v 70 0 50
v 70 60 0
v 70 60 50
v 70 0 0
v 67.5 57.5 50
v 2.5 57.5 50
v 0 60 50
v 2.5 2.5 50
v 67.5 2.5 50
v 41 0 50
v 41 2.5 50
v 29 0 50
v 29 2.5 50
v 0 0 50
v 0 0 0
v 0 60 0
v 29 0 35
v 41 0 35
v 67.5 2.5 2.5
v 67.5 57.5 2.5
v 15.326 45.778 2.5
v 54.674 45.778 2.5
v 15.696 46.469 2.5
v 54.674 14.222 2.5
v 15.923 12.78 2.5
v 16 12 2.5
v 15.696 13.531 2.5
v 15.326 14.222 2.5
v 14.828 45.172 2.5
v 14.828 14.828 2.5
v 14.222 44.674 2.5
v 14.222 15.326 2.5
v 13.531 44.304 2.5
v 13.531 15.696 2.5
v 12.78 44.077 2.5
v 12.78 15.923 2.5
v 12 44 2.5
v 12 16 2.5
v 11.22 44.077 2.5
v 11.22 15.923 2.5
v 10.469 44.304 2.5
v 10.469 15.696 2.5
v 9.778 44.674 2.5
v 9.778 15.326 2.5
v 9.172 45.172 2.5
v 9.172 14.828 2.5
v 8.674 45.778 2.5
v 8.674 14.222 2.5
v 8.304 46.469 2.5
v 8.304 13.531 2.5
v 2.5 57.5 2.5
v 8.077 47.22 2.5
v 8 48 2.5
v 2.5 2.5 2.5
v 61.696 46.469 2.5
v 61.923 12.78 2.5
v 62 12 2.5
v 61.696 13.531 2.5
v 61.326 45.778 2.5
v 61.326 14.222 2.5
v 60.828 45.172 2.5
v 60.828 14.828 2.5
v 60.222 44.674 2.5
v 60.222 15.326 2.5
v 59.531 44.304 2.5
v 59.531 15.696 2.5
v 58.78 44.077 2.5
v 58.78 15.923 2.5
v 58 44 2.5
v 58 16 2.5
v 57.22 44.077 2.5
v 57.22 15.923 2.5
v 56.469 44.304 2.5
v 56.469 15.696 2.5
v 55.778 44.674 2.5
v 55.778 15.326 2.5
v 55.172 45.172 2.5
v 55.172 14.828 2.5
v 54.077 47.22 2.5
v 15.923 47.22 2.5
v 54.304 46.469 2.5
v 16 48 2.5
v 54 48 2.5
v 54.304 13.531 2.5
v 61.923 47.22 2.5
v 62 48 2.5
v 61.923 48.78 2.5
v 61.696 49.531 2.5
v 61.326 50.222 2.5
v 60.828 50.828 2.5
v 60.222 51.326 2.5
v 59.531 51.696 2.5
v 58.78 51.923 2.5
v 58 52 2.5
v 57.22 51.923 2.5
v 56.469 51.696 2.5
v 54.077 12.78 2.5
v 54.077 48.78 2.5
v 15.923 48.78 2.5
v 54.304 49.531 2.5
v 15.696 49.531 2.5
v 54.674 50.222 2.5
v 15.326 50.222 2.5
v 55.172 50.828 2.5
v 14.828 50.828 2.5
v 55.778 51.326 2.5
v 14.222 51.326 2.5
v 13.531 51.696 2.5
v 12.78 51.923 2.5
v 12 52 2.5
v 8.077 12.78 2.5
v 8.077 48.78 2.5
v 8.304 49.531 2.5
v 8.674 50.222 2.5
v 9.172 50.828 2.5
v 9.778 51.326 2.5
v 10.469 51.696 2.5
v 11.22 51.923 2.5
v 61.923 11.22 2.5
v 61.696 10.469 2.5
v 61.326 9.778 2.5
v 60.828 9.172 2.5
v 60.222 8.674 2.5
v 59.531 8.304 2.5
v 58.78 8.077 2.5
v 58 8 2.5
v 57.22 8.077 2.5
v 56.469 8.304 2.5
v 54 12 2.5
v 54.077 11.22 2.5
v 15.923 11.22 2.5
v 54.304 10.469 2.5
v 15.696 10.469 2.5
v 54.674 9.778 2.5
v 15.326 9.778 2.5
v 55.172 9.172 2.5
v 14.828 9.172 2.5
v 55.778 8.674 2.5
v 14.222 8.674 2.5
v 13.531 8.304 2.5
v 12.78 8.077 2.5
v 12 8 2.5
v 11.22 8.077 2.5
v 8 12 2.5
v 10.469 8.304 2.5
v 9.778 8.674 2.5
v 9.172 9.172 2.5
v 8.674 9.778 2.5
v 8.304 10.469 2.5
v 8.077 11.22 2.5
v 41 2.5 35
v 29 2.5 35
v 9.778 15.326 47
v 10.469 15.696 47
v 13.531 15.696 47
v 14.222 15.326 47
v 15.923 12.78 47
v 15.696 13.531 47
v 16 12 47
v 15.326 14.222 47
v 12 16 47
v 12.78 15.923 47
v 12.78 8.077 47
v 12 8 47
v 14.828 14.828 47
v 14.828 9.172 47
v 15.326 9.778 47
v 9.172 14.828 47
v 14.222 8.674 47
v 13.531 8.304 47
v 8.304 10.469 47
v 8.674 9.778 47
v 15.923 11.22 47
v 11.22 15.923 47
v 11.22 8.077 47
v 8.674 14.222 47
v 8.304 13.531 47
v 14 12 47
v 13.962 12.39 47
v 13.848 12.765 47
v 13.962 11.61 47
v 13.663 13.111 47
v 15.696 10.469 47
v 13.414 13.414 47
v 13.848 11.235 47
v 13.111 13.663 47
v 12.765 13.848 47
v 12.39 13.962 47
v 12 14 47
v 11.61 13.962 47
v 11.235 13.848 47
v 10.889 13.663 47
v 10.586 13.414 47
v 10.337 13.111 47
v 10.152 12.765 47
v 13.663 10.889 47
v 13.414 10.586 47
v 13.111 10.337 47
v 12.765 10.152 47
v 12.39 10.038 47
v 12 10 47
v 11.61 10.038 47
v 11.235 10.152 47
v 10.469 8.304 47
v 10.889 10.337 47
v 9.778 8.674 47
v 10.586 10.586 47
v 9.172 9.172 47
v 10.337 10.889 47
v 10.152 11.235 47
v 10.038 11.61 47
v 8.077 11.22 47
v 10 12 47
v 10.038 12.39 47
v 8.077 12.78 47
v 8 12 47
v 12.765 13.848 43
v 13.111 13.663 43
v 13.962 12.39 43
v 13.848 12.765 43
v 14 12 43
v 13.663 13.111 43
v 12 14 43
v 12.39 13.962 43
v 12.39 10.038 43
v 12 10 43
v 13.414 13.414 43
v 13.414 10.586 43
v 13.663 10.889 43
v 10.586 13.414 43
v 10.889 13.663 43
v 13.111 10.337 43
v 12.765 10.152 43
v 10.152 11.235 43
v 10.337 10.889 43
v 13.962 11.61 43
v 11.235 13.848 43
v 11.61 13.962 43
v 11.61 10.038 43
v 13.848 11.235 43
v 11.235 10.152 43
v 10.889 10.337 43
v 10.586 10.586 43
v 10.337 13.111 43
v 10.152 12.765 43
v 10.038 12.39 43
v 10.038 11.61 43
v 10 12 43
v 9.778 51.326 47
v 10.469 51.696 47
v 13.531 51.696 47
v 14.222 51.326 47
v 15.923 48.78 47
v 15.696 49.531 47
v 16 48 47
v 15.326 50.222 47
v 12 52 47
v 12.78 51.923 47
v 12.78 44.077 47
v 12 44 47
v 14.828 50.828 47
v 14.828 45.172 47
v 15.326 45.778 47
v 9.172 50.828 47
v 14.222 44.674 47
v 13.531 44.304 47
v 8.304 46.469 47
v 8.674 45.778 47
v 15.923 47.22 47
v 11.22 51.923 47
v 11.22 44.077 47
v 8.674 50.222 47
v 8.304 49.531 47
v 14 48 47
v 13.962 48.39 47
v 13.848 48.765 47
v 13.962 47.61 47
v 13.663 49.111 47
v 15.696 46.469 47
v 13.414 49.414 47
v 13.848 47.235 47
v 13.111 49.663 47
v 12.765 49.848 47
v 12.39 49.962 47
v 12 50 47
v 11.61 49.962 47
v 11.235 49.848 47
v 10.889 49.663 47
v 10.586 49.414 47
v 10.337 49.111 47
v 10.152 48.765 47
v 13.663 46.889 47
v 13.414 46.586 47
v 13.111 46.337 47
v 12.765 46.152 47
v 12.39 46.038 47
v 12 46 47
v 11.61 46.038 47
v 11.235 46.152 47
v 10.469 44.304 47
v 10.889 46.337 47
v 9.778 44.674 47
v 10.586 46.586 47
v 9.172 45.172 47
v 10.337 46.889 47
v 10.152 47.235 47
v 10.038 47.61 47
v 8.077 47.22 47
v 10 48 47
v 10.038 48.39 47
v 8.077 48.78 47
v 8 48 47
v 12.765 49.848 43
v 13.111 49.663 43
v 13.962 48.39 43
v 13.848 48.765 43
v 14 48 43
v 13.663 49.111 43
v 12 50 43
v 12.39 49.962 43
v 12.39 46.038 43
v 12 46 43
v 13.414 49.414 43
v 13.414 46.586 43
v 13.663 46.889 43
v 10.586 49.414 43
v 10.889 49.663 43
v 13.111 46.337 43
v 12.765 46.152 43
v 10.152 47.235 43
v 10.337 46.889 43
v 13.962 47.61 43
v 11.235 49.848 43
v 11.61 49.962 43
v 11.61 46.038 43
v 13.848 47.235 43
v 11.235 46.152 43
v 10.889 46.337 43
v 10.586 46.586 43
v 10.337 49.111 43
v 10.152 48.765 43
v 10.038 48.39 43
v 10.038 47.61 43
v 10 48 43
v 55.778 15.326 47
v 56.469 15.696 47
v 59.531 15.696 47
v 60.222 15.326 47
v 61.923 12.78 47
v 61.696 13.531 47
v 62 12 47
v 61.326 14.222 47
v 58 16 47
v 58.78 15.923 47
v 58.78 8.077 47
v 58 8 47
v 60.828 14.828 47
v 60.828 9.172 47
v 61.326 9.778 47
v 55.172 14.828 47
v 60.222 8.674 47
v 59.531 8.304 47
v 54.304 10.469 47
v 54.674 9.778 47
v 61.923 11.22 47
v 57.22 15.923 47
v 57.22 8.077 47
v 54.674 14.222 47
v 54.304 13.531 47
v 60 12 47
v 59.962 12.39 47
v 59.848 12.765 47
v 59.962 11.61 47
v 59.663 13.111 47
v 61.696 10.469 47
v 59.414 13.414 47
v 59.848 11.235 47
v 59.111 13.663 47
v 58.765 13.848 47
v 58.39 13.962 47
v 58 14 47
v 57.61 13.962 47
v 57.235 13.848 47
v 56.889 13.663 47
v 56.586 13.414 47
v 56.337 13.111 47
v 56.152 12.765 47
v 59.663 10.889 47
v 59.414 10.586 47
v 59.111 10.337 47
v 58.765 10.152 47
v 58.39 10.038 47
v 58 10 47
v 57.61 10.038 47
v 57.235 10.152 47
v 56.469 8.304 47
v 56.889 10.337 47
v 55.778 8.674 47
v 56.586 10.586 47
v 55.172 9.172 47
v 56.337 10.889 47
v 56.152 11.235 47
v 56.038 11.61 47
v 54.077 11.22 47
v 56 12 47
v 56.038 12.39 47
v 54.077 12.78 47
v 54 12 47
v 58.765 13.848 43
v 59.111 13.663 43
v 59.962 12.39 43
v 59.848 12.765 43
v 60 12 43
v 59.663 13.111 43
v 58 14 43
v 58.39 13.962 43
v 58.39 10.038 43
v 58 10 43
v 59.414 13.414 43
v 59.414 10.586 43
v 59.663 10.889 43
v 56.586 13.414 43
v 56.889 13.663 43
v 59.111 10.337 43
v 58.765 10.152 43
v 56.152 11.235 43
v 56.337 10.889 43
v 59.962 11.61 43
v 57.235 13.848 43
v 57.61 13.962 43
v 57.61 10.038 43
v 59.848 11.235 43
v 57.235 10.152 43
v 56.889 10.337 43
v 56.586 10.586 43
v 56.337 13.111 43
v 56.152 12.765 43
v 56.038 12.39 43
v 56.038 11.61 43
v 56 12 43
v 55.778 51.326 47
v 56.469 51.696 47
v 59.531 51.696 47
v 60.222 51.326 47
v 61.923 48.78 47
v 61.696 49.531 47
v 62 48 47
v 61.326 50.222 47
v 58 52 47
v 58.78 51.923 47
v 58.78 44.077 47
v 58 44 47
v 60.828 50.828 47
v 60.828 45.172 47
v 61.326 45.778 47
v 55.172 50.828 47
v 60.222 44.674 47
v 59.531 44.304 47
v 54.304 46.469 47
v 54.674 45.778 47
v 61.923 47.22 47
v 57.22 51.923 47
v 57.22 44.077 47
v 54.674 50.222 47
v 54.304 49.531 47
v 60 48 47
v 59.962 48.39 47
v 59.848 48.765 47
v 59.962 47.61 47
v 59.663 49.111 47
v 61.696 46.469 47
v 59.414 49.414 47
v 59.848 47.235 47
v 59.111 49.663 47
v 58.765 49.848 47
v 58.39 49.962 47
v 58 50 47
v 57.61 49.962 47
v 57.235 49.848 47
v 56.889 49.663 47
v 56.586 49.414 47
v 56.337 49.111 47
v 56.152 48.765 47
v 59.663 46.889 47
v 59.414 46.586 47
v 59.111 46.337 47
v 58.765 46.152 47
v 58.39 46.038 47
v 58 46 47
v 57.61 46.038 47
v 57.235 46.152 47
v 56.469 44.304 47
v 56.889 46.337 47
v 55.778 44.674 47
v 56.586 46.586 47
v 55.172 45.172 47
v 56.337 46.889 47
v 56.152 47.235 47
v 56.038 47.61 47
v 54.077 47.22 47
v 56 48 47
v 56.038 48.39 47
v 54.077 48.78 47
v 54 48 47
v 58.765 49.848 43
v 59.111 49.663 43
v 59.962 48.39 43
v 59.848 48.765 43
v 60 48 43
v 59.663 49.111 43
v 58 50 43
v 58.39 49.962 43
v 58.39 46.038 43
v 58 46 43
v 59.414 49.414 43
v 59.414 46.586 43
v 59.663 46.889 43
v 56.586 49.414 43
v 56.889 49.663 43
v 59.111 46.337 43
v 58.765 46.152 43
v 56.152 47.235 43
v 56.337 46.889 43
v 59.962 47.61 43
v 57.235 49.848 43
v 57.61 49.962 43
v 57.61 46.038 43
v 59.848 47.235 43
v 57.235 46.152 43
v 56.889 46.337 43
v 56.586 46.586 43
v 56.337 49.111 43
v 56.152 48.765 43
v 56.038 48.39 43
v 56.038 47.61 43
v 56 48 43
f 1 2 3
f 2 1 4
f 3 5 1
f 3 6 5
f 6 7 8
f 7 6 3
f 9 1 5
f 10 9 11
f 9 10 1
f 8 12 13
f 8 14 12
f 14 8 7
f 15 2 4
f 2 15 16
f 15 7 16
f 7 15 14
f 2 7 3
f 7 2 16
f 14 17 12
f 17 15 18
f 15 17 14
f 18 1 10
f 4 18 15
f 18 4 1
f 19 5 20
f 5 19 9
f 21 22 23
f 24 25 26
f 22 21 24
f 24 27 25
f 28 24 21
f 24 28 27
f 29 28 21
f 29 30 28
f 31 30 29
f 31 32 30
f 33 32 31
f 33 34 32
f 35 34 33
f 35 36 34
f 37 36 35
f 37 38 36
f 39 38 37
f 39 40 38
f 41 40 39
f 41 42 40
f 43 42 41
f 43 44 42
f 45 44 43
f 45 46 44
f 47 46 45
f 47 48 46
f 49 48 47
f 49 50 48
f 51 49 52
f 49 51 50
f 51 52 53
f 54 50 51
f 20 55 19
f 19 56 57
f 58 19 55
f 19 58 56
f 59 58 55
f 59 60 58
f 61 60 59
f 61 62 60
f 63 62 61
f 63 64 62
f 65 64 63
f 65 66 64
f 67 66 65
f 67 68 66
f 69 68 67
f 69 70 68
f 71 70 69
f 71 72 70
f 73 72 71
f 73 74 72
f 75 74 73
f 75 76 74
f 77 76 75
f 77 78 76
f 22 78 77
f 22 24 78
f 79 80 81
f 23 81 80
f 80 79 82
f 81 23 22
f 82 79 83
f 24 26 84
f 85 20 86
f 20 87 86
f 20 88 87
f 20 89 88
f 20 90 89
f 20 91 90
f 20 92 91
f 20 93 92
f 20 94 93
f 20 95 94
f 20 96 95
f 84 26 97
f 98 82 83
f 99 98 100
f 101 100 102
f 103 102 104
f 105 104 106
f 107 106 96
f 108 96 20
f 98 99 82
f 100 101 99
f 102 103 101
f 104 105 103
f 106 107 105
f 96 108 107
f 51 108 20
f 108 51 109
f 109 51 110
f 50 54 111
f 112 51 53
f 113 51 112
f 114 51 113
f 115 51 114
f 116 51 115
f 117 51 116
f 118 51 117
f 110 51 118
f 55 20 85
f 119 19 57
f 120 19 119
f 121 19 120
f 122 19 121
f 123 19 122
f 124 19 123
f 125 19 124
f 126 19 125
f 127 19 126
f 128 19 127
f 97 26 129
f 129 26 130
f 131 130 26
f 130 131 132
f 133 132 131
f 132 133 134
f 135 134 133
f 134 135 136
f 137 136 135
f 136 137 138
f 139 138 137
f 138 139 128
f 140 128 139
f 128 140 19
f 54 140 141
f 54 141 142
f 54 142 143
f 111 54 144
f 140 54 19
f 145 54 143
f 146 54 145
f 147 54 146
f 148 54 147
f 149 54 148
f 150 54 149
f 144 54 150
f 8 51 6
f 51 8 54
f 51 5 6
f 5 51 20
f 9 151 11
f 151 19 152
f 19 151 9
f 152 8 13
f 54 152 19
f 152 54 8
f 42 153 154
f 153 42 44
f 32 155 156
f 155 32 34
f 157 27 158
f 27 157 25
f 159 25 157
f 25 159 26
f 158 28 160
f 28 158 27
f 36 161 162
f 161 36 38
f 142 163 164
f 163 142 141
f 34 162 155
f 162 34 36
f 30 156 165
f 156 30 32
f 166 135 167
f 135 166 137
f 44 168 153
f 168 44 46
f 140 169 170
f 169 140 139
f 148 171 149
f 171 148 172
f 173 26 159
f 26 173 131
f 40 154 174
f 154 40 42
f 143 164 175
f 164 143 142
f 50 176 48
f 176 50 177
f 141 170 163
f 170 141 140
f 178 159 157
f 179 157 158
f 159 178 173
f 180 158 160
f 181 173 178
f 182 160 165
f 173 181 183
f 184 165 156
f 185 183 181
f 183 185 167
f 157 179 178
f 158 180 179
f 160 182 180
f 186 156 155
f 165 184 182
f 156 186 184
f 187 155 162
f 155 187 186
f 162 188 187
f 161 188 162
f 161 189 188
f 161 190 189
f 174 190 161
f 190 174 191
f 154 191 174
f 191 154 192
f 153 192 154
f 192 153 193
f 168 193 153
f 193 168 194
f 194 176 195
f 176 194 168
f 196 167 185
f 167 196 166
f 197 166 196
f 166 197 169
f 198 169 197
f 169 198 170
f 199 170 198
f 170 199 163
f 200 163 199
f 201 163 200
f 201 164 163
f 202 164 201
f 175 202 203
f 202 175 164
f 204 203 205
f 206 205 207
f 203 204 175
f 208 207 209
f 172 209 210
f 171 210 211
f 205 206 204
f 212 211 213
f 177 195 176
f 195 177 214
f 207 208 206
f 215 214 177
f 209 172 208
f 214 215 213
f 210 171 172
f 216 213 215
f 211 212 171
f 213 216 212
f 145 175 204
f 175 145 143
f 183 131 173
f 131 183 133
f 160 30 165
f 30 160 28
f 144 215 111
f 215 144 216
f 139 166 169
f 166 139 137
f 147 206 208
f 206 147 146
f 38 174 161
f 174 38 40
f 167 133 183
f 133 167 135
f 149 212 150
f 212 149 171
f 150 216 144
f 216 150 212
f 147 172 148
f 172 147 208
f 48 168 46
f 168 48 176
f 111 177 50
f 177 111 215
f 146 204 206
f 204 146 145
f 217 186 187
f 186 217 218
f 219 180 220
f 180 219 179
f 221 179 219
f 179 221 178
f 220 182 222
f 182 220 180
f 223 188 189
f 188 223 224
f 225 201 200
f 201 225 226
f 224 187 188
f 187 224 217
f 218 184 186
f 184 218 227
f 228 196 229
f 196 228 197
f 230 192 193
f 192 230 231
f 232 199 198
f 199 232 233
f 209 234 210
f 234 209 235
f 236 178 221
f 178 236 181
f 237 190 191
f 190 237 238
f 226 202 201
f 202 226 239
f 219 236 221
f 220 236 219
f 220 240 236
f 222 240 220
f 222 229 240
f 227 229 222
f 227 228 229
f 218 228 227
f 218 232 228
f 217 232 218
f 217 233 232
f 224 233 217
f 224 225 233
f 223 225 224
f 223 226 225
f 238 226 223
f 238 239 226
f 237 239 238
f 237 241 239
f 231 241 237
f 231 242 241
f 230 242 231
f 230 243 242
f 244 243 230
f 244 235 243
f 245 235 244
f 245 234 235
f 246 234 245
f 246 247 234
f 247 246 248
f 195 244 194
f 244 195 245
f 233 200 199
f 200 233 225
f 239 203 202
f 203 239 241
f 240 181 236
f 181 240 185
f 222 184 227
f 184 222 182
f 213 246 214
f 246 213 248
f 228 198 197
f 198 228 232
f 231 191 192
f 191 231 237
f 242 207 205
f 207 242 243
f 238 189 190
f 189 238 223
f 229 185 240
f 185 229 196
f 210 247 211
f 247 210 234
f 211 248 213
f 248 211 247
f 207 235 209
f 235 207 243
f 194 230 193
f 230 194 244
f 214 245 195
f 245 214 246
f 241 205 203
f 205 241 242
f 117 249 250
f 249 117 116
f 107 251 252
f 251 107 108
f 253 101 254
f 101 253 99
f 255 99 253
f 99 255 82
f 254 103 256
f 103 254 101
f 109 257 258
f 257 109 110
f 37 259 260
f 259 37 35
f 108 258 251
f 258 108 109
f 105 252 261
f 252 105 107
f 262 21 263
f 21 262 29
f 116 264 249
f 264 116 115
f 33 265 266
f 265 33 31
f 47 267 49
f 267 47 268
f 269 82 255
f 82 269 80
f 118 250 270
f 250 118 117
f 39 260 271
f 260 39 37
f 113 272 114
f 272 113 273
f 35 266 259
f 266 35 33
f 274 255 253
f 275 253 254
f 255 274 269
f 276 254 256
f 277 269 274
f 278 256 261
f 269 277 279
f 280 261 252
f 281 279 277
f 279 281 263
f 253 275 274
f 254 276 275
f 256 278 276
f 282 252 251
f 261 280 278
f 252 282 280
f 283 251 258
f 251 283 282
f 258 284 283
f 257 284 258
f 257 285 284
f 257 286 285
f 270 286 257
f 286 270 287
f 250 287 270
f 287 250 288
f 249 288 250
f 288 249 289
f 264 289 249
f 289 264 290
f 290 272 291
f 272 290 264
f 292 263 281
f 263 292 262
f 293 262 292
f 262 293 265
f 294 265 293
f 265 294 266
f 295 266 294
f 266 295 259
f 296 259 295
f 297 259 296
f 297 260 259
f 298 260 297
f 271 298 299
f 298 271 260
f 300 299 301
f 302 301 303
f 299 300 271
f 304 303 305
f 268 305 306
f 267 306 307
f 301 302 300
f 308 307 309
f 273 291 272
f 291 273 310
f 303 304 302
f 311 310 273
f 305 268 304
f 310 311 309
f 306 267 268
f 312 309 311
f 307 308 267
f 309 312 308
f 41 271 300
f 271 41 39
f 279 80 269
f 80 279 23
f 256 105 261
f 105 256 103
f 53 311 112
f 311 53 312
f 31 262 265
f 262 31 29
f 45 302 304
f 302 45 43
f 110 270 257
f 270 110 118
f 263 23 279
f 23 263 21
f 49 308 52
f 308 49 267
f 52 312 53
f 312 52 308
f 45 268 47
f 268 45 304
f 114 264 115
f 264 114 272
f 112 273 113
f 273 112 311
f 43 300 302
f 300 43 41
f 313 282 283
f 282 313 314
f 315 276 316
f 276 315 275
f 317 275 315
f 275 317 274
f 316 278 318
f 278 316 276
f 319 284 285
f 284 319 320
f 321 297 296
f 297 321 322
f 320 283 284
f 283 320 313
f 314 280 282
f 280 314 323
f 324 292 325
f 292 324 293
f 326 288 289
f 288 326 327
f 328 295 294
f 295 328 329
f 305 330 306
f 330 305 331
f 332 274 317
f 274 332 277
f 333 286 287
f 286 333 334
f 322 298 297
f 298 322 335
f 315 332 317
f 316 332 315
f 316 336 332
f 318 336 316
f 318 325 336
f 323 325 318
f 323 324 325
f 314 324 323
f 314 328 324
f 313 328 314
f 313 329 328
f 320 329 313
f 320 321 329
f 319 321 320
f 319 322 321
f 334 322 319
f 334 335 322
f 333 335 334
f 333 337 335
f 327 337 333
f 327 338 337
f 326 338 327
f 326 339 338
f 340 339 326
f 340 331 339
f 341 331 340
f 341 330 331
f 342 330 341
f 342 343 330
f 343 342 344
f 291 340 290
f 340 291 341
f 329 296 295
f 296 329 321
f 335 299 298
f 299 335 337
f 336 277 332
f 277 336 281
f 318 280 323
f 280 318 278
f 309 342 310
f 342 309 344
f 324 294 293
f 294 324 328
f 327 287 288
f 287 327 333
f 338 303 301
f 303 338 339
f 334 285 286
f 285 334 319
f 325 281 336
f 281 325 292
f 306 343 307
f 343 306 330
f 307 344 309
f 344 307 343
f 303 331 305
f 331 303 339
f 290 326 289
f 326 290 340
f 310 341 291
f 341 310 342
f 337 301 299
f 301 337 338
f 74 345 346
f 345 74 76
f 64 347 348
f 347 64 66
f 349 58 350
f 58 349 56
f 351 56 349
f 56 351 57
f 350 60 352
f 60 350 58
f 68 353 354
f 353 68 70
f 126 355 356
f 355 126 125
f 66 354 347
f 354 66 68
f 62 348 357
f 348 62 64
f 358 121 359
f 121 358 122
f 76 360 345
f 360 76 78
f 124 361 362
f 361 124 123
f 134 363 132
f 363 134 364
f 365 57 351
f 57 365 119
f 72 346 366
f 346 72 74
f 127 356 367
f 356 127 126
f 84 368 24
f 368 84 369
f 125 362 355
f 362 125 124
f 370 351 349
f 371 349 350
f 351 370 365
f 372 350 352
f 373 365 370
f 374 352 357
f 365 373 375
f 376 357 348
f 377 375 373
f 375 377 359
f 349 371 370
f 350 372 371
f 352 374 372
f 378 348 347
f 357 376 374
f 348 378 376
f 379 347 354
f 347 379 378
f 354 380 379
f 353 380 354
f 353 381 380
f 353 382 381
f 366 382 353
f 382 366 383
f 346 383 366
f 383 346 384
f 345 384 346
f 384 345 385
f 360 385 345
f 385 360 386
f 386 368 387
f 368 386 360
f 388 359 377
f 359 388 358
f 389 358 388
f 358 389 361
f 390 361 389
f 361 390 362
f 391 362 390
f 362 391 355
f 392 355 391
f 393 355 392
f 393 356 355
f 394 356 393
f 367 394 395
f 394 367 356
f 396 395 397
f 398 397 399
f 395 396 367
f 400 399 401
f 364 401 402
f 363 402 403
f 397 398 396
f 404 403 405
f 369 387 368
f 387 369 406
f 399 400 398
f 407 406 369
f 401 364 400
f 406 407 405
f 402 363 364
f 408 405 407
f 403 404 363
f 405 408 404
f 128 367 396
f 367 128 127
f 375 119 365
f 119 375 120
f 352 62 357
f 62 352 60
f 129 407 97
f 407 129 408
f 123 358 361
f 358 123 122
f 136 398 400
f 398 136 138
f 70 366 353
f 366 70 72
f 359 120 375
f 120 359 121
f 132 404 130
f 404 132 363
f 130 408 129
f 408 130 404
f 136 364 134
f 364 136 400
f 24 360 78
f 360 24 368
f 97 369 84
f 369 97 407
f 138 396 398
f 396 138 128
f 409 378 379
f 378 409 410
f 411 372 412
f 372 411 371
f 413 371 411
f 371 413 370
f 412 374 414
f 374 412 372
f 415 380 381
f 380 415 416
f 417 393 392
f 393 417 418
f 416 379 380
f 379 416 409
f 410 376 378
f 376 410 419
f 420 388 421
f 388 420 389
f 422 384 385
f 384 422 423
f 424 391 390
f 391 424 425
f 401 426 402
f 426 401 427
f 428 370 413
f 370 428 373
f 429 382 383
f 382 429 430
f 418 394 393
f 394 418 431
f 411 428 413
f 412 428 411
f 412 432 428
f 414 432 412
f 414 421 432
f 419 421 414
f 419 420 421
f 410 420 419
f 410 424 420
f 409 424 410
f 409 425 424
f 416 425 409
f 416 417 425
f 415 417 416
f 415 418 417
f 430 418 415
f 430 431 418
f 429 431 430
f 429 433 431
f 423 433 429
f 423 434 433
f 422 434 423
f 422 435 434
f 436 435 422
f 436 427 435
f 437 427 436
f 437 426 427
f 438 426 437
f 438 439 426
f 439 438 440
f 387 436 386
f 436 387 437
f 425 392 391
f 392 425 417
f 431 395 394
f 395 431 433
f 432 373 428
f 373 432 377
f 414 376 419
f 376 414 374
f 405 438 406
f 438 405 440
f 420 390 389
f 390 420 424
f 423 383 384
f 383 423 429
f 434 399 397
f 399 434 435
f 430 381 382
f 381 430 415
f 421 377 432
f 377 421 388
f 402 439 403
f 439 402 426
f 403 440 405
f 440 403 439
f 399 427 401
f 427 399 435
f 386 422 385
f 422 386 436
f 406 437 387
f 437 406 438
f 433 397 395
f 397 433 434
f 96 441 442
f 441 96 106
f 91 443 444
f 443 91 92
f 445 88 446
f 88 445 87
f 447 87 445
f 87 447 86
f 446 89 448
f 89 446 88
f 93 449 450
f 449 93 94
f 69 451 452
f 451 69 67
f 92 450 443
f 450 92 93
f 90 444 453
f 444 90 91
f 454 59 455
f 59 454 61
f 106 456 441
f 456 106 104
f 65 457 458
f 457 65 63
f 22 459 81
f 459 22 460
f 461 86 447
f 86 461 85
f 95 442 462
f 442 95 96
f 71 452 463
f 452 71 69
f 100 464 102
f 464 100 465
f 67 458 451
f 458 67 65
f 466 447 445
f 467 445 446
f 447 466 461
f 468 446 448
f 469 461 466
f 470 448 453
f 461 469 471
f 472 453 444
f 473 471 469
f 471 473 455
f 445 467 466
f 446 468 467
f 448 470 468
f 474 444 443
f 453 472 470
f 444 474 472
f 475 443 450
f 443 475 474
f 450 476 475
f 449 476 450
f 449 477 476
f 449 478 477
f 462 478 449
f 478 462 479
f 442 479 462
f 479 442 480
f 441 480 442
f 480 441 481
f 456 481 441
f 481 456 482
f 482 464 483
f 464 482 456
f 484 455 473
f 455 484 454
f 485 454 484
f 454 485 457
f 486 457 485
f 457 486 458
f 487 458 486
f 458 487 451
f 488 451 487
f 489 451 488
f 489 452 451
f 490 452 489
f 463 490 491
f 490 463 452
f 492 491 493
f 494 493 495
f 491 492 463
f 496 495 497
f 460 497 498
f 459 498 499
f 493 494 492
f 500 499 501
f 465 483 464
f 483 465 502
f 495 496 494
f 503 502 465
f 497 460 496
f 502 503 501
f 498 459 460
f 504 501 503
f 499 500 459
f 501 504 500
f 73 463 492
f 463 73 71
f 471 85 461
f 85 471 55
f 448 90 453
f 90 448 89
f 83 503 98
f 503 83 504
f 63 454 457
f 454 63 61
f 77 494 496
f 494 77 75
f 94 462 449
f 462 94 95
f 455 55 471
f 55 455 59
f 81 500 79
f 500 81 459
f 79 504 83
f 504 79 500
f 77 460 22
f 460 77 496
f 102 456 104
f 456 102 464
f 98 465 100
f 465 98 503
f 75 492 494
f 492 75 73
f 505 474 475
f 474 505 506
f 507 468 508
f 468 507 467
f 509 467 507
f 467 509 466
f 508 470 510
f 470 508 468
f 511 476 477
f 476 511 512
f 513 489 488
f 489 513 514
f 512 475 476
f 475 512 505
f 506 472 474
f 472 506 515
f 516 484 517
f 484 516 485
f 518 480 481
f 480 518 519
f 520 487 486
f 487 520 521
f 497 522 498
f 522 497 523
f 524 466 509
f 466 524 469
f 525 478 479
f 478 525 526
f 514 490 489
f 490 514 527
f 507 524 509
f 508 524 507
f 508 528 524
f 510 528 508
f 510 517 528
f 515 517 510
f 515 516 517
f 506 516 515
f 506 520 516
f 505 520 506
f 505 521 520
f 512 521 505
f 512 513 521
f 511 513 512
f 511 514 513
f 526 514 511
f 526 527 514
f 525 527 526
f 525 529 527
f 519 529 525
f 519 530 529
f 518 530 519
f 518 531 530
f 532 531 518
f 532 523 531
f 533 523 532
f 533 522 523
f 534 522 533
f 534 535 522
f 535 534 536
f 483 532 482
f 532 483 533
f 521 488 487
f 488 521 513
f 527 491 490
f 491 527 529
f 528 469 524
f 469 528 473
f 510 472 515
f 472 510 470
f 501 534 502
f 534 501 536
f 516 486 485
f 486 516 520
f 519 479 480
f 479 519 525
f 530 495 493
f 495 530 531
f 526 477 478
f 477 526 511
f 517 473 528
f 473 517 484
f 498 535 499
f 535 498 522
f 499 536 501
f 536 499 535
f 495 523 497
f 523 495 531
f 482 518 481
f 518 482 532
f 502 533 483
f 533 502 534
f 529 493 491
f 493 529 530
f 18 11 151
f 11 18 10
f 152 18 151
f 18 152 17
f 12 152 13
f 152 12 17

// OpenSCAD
$fn = 32;

// ----------------------------------------------------------------------
// Enclosure box: both enclosure
// ----------------------------------------------------------------------

// --- parameters (mm) ---
box_l = 70;               // outer length, X
box_w = 60;               // outer width, Y
box_h = 50;               // outer height
wall_t = 2.5;             // wall thickness
boss_r = 4;               // corner boss radius
hole_r = 2;               // boss screw hole radius
boss_in = 12;             // boss inset from the corners
notch_w = 12;             // cable notch width
notch_h = 15;             // cable notch height

inner_h = box_h - wall_t;  // cavity depth
boss_h = inner_h - 2;  // corner boss height

difference() {
  union() {
    difference() {
      cube([box_l, box_w, box_h]);
      translate([wall_t, wall_t, wall_t])
        cube([box_l - 2 * wall_t, box_w - 2 * wall_t, box_h]);
    }
    for (sx = [0, 1], sy = [0, 1])
      translate([sx ? box_l - boss_in : boss_in,
                 sy ? box_w - boss_in : boss_in, wall_t - 1])
        difference() {
          cylinder(r = boss_r, h = boss_h);
          translate([0, 0, boss_h - 4])
            cylinder(r = hole_r, h = 5);
        }
  }
  translate([box_l / 2 - notch_w / 2, -1, box_h - notch_h])
    cube([notch_w, wall_t + 2, notch_h + 1]);
}
